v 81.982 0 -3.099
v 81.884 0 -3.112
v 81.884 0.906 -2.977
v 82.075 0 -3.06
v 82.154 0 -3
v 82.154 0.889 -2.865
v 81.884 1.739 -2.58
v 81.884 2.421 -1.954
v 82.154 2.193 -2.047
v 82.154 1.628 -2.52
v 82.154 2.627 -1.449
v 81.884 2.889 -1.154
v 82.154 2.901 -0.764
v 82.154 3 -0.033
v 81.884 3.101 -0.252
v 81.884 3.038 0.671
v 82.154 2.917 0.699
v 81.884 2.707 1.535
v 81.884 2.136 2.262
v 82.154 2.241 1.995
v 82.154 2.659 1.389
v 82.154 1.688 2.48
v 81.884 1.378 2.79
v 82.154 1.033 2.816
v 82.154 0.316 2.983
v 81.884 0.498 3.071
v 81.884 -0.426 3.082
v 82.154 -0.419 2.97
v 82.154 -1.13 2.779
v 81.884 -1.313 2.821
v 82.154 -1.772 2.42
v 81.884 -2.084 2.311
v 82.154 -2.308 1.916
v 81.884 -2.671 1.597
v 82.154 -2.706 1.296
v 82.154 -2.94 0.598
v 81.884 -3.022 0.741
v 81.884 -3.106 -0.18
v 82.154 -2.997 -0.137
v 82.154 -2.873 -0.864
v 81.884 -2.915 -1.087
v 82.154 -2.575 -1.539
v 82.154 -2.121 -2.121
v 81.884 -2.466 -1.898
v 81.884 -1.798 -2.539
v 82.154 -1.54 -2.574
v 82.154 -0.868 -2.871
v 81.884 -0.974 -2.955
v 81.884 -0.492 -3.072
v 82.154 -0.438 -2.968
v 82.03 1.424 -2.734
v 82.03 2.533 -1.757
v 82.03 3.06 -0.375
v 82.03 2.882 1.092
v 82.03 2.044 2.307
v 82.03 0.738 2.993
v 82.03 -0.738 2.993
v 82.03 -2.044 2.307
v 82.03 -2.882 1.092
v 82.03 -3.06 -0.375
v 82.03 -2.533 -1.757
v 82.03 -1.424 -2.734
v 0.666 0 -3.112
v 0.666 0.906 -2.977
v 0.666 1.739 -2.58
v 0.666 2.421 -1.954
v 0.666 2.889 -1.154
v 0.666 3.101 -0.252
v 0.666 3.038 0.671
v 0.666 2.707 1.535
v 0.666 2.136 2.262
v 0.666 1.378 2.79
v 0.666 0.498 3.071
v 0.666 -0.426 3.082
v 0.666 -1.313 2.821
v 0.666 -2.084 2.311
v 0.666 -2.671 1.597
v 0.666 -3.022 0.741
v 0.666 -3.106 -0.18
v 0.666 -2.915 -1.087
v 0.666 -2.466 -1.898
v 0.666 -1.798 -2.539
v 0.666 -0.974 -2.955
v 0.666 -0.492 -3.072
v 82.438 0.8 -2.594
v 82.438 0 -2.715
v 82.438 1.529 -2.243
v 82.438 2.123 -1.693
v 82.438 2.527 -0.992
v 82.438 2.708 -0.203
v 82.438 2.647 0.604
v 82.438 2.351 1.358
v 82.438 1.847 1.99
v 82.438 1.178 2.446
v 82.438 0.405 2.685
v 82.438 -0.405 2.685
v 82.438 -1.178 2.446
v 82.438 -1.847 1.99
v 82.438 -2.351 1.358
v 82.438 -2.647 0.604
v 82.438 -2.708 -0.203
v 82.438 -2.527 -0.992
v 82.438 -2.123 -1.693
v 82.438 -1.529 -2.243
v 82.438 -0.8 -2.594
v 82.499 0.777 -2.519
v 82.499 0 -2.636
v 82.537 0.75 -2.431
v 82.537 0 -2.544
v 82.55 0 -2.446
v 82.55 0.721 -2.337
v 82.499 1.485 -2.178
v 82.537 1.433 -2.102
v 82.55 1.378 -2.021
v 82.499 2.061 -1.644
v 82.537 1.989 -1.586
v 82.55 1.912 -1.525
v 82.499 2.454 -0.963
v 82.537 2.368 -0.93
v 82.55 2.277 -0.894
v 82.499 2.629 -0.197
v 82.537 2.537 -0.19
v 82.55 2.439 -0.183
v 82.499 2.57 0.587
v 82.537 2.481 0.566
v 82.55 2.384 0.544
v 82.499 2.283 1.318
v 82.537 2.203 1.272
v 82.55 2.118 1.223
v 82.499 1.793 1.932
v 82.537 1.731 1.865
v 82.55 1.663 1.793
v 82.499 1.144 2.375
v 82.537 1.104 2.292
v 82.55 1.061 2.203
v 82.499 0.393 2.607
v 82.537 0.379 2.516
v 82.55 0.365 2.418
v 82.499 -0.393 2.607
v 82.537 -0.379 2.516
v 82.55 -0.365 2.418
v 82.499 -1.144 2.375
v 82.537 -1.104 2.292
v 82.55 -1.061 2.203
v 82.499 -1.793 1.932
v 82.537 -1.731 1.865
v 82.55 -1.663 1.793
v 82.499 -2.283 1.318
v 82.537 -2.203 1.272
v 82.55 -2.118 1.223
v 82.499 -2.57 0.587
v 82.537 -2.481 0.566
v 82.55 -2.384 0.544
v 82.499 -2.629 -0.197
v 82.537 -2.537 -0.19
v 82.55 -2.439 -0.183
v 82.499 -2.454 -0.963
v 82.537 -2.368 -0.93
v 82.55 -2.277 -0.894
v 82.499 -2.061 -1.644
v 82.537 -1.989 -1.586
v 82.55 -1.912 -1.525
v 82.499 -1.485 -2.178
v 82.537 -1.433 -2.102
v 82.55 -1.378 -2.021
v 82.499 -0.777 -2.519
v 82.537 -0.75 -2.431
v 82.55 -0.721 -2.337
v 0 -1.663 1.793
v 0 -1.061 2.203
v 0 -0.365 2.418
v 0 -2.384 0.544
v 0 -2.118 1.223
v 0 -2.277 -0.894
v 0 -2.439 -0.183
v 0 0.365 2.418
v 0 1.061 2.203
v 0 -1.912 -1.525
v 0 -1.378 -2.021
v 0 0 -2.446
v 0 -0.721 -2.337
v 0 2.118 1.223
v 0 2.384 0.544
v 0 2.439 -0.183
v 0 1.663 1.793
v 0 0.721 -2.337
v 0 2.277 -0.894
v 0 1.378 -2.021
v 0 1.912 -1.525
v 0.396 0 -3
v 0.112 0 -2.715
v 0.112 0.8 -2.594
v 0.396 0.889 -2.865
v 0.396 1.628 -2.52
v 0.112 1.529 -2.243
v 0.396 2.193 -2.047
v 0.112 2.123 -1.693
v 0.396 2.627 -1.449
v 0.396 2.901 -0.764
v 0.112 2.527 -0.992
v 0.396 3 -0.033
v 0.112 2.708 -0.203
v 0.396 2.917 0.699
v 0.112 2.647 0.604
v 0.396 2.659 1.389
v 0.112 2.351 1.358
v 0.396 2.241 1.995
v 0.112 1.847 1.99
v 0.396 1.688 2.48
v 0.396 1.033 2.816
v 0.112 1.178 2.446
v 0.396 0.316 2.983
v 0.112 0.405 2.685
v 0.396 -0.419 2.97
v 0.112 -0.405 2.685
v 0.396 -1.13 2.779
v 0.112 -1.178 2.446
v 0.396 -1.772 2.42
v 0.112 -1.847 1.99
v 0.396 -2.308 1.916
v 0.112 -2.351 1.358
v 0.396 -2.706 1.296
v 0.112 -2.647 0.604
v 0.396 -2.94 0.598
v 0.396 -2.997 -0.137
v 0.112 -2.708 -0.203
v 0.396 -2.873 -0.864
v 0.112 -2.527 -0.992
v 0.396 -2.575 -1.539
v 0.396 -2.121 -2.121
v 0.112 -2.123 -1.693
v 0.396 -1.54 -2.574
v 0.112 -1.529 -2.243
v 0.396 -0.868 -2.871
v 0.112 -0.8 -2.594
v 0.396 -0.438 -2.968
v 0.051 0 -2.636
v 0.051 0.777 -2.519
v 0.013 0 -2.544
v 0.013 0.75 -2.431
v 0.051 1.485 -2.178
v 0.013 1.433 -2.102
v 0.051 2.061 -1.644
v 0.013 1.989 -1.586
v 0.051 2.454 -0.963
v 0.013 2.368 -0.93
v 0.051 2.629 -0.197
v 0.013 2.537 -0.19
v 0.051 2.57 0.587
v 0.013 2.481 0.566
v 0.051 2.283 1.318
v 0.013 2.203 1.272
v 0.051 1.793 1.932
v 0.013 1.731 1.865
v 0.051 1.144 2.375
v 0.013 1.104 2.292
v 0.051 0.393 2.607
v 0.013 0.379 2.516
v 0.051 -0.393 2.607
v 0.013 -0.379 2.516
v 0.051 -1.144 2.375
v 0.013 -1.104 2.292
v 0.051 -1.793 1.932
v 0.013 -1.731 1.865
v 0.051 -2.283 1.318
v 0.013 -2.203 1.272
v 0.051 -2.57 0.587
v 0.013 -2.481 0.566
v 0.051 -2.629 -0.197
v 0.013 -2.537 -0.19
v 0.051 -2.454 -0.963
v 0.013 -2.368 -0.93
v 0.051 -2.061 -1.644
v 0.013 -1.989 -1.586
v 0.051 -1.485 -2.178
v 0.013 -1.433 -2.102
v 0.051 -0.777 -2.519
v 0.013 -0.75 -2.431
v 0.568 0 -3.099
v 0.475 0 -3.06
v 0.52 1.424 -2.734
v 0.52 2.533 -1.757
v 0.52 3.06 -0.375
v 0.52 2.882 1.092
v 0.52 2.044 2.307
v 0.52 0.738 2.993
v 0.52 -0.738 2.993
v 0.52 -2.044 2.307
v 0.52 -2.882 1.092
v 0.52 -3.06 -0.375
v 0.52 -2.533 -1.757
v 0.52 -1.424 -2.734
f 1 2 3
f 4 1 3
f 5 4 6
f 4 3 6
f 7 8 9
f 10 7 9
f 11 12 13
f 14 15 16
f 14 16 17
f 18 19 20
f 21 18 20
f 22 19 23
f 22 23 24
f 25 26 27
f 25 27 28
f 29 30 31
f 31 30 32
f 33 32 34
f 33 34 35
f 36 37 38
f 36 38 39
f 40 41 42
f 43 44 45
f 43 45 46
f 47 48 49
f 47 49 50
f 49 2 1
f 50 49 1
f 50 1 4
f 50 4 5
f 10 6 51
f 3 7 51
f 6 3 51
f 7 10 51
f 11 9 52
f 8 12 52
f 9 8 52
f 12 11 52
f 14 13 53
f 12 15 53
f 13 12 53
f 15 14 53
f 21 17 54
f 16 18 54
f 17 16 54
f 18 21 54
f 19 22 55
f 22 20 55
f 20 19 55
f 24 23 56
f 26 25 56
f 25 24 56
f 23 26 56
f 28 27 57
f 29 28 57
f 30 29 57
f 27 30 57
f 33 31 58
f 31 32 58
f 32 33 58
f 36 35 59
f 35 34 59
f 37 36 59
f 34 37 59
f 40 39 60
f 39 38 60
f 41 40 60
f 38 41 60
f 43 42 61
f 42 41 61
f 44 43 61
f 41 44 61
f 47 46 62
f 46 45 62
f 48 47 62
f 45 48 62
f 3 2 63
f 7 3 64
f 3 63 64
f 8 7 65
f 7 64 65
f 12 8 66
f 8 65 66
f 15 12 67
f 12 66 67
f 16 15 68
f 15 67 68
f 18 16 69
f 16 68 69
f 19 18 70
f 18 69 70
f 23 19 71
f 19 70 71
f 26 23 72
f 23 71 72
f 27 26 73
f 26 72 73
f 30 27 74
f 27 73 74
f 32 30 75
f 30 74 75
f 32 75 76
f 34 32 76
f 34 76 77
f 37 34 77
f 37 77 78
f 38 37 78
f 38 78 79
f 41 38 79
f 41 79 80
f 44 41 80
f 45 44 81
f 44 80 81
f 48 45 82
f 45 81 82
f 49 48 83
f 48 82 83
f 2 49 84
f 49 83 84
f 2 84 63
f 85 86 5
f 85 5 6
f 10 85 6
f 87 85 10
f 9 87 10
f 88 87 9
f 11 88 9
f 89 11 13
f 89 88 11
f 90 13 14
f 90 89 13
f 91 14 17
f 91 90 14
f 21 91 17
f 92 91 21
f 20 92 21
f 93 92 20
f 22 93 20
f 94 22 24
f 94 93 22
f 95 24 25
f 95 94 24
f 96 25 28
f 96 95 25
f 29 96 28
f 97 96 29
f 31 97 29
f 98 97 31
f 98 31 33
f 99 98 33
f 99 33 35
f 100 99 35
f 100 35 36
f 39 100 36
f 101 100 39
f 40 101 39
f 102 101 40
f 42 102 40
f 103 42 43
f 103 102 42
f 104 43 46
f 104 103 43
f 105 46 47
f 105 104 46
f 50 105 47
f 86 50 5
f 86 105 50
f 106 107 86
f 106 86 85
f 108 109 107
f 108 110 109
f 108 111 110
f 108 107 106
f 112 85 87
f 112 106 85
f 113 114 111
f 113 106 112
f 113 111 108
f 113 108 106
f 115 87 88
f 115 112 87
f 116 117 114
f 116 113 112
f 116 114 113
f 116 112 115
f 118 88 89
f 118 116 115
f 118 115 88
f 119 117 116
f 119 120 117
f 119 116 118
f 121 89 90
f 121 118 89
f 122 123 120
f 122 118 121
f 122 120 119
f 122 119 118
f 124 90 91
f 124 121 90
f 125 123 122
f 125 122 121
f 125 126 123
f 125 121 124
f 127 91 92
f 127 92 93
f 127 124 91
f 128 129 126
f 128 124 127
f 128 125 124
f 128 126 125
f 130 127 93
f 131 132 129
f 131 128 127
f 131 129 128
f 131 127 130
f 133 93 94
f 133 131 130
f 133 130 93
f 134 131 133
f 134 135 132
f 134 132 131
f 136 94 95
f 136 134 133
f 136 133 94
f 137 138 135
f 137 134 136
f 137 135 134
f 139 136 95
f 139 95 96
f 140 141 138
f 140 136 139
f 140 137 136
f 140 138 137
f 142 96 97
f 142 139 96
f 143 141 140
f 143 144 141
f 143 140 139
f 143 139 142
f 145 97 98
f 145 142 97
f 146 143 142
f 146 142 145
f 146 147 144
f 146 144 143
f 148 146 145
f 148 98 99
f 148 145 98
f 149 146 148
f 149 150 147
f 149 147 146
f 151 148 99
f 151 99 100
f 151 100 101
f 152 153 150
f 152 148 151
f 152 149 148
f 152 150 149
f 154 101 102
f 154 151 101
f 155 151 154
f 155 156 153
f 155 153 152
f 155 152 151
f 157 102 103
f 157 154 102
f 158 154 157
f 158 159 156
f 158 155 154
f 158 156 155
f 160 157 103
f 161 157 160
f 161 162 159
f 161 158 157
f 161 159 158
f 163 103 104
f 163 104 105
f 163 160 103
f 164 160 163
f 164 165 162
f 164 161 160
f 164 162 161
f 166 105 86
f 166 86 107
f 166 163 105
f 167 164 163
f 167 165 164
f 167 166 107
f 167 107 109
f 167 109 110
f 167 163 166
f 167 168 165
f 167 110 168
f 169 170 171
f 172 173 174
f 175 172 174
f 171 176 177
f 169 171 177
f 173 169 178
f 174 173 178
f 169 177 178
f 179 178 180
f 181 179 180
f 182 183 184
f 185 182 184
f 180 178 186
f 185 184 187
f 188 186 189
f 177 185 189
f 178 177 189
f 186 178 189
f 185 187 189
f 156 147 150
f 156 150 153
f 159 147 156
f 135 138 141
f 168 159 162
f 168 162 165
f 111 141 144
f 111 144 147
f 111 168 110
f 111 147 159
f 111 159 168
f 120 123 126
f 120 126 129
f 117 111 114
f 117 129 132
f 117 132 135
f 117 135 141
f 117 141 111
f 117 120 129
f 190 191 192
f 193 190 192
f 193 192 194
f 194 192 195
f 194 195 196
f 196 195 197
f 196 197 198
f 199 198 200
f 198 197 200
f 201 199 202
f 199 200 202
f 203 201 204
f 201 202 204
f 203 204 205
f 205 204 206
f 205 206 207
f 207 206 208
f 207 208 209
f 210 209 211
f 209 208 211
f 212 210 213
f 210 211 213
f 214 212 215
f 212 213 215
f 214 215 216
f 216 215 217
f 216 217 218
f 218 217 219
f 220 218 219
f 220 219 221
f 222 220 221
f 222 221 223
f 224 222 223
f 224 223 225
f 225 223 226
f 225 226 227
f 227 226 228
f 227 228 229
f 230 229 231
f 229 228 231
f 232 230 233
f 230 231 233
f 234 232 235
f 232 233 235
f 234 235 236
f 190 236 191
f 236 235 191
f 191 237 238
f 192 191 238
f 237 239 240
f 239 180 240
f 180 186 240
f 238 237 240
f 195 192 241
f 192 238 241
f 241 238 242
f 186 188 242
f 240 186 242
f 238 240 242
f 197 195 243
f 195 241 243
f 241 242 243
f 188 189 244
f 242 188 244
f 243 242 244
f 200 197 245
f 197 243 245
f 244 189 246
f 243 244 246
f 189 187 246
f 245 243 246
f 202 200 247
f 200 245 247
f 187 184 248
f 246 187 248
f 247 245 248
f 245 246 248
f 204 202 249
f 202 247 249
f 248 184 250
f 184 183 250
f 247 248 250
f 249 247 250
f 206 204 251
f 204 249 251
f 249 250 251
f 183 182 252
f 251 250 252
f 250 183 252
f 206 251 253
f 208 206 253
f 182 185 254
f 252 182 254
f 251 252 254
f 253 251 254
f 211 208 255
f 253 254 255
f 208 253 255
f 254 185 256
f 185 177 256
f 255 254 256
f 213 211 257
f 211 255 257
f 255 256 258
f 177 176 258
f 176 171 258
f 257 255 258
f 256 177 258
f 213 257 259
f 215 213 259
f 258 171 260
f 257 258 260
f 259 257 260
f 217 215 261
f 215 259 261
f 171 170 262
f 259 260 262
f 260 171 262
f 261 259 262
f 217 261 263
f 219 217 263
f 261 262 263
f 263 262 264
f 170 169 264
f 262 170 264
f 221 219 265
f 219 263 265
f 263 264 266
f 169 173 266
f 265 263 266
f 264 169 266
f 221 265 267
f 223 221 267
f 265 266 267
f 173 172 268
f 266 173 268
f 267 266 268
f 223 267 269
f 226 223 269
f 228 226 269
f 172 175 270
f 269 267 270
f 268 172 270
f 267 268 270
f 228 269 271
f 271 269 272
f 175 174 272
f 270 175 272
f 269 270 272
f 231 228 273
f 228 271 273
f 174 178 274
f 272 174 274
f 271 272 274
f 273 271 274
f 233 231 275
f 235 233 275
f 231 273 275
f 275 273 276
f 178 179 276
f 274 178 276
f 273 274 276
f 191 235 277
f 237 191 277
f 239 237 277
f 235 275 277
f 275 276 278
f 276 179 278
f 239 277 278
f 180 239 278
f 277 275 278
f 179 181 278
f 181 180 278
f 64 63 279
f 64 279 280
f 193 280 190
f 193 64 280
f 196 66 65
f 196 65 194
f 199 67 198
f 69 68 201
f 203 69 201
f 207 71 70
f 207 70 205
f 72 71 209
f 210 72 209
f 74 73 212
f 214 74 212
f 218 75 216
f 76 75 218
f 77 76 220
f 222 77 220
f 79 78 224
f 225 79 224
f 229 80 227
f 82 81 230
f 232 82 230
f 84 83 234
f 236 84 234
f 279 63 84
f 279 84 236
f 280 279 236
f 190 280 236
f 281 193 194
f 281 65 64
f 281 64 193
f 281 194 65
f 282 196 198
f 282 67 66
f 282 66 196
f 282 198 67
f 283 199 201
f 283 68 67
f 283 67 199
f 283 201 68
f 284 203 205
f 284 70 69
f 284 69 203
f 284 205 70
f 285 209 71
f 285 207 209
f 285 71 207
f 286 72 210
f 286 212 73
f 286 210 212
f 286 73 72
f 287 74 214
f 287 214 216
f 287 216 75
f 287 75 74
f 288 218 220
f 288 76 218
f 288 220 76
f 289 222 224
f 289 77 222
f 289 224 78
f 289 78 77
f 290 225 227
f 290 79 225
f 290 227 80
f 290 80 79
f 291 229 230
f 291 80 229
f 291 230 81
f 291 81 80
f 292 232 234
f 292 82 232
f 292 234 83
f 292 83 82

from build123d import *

# Parameters (mm, degrees)
SKETCH1_R           = 3.1115
BOSS_EXTRUDE1_DEPTH = 82.55
CHAMFER1_SIZE       = 0.508
FILLET1_R           = 0.381


with BuildPart() as part:
    # Sketch1 → Boss-Extrude1 (new body)
    with BuildSketch(Plane(origin=(0, 0, 0), x_dir=(0, 0, -1), z_dir=(1, 0, 0))):
        Circle(SKETCH1_R)
    extrude(amount=BOSS_EXTRUDE1_DEPTH)

    # Chamfer1
    chamfer1_edges = [part.edges().sort_by_distance(p)[0] for p in [
        (0, 0, 3.1115),
        (82.55, 0, 3.1115),
    ]]
    chamfer(chamfer1_edges, length=CHAMFER1_SIZE)

    # Fillet1
    fillet1_edges = [part.edges().sort_by_distance(p)[0] for p in [
        (82.55, 0, 2.6035),
        (0.508, 0, 3.1115),
        (82.042, 0, 3.1115),
        (0, 0, 2.6035),
    ]]
    fillet(fillet1_edges, radius=FILLET1_R)


solid = part.part
